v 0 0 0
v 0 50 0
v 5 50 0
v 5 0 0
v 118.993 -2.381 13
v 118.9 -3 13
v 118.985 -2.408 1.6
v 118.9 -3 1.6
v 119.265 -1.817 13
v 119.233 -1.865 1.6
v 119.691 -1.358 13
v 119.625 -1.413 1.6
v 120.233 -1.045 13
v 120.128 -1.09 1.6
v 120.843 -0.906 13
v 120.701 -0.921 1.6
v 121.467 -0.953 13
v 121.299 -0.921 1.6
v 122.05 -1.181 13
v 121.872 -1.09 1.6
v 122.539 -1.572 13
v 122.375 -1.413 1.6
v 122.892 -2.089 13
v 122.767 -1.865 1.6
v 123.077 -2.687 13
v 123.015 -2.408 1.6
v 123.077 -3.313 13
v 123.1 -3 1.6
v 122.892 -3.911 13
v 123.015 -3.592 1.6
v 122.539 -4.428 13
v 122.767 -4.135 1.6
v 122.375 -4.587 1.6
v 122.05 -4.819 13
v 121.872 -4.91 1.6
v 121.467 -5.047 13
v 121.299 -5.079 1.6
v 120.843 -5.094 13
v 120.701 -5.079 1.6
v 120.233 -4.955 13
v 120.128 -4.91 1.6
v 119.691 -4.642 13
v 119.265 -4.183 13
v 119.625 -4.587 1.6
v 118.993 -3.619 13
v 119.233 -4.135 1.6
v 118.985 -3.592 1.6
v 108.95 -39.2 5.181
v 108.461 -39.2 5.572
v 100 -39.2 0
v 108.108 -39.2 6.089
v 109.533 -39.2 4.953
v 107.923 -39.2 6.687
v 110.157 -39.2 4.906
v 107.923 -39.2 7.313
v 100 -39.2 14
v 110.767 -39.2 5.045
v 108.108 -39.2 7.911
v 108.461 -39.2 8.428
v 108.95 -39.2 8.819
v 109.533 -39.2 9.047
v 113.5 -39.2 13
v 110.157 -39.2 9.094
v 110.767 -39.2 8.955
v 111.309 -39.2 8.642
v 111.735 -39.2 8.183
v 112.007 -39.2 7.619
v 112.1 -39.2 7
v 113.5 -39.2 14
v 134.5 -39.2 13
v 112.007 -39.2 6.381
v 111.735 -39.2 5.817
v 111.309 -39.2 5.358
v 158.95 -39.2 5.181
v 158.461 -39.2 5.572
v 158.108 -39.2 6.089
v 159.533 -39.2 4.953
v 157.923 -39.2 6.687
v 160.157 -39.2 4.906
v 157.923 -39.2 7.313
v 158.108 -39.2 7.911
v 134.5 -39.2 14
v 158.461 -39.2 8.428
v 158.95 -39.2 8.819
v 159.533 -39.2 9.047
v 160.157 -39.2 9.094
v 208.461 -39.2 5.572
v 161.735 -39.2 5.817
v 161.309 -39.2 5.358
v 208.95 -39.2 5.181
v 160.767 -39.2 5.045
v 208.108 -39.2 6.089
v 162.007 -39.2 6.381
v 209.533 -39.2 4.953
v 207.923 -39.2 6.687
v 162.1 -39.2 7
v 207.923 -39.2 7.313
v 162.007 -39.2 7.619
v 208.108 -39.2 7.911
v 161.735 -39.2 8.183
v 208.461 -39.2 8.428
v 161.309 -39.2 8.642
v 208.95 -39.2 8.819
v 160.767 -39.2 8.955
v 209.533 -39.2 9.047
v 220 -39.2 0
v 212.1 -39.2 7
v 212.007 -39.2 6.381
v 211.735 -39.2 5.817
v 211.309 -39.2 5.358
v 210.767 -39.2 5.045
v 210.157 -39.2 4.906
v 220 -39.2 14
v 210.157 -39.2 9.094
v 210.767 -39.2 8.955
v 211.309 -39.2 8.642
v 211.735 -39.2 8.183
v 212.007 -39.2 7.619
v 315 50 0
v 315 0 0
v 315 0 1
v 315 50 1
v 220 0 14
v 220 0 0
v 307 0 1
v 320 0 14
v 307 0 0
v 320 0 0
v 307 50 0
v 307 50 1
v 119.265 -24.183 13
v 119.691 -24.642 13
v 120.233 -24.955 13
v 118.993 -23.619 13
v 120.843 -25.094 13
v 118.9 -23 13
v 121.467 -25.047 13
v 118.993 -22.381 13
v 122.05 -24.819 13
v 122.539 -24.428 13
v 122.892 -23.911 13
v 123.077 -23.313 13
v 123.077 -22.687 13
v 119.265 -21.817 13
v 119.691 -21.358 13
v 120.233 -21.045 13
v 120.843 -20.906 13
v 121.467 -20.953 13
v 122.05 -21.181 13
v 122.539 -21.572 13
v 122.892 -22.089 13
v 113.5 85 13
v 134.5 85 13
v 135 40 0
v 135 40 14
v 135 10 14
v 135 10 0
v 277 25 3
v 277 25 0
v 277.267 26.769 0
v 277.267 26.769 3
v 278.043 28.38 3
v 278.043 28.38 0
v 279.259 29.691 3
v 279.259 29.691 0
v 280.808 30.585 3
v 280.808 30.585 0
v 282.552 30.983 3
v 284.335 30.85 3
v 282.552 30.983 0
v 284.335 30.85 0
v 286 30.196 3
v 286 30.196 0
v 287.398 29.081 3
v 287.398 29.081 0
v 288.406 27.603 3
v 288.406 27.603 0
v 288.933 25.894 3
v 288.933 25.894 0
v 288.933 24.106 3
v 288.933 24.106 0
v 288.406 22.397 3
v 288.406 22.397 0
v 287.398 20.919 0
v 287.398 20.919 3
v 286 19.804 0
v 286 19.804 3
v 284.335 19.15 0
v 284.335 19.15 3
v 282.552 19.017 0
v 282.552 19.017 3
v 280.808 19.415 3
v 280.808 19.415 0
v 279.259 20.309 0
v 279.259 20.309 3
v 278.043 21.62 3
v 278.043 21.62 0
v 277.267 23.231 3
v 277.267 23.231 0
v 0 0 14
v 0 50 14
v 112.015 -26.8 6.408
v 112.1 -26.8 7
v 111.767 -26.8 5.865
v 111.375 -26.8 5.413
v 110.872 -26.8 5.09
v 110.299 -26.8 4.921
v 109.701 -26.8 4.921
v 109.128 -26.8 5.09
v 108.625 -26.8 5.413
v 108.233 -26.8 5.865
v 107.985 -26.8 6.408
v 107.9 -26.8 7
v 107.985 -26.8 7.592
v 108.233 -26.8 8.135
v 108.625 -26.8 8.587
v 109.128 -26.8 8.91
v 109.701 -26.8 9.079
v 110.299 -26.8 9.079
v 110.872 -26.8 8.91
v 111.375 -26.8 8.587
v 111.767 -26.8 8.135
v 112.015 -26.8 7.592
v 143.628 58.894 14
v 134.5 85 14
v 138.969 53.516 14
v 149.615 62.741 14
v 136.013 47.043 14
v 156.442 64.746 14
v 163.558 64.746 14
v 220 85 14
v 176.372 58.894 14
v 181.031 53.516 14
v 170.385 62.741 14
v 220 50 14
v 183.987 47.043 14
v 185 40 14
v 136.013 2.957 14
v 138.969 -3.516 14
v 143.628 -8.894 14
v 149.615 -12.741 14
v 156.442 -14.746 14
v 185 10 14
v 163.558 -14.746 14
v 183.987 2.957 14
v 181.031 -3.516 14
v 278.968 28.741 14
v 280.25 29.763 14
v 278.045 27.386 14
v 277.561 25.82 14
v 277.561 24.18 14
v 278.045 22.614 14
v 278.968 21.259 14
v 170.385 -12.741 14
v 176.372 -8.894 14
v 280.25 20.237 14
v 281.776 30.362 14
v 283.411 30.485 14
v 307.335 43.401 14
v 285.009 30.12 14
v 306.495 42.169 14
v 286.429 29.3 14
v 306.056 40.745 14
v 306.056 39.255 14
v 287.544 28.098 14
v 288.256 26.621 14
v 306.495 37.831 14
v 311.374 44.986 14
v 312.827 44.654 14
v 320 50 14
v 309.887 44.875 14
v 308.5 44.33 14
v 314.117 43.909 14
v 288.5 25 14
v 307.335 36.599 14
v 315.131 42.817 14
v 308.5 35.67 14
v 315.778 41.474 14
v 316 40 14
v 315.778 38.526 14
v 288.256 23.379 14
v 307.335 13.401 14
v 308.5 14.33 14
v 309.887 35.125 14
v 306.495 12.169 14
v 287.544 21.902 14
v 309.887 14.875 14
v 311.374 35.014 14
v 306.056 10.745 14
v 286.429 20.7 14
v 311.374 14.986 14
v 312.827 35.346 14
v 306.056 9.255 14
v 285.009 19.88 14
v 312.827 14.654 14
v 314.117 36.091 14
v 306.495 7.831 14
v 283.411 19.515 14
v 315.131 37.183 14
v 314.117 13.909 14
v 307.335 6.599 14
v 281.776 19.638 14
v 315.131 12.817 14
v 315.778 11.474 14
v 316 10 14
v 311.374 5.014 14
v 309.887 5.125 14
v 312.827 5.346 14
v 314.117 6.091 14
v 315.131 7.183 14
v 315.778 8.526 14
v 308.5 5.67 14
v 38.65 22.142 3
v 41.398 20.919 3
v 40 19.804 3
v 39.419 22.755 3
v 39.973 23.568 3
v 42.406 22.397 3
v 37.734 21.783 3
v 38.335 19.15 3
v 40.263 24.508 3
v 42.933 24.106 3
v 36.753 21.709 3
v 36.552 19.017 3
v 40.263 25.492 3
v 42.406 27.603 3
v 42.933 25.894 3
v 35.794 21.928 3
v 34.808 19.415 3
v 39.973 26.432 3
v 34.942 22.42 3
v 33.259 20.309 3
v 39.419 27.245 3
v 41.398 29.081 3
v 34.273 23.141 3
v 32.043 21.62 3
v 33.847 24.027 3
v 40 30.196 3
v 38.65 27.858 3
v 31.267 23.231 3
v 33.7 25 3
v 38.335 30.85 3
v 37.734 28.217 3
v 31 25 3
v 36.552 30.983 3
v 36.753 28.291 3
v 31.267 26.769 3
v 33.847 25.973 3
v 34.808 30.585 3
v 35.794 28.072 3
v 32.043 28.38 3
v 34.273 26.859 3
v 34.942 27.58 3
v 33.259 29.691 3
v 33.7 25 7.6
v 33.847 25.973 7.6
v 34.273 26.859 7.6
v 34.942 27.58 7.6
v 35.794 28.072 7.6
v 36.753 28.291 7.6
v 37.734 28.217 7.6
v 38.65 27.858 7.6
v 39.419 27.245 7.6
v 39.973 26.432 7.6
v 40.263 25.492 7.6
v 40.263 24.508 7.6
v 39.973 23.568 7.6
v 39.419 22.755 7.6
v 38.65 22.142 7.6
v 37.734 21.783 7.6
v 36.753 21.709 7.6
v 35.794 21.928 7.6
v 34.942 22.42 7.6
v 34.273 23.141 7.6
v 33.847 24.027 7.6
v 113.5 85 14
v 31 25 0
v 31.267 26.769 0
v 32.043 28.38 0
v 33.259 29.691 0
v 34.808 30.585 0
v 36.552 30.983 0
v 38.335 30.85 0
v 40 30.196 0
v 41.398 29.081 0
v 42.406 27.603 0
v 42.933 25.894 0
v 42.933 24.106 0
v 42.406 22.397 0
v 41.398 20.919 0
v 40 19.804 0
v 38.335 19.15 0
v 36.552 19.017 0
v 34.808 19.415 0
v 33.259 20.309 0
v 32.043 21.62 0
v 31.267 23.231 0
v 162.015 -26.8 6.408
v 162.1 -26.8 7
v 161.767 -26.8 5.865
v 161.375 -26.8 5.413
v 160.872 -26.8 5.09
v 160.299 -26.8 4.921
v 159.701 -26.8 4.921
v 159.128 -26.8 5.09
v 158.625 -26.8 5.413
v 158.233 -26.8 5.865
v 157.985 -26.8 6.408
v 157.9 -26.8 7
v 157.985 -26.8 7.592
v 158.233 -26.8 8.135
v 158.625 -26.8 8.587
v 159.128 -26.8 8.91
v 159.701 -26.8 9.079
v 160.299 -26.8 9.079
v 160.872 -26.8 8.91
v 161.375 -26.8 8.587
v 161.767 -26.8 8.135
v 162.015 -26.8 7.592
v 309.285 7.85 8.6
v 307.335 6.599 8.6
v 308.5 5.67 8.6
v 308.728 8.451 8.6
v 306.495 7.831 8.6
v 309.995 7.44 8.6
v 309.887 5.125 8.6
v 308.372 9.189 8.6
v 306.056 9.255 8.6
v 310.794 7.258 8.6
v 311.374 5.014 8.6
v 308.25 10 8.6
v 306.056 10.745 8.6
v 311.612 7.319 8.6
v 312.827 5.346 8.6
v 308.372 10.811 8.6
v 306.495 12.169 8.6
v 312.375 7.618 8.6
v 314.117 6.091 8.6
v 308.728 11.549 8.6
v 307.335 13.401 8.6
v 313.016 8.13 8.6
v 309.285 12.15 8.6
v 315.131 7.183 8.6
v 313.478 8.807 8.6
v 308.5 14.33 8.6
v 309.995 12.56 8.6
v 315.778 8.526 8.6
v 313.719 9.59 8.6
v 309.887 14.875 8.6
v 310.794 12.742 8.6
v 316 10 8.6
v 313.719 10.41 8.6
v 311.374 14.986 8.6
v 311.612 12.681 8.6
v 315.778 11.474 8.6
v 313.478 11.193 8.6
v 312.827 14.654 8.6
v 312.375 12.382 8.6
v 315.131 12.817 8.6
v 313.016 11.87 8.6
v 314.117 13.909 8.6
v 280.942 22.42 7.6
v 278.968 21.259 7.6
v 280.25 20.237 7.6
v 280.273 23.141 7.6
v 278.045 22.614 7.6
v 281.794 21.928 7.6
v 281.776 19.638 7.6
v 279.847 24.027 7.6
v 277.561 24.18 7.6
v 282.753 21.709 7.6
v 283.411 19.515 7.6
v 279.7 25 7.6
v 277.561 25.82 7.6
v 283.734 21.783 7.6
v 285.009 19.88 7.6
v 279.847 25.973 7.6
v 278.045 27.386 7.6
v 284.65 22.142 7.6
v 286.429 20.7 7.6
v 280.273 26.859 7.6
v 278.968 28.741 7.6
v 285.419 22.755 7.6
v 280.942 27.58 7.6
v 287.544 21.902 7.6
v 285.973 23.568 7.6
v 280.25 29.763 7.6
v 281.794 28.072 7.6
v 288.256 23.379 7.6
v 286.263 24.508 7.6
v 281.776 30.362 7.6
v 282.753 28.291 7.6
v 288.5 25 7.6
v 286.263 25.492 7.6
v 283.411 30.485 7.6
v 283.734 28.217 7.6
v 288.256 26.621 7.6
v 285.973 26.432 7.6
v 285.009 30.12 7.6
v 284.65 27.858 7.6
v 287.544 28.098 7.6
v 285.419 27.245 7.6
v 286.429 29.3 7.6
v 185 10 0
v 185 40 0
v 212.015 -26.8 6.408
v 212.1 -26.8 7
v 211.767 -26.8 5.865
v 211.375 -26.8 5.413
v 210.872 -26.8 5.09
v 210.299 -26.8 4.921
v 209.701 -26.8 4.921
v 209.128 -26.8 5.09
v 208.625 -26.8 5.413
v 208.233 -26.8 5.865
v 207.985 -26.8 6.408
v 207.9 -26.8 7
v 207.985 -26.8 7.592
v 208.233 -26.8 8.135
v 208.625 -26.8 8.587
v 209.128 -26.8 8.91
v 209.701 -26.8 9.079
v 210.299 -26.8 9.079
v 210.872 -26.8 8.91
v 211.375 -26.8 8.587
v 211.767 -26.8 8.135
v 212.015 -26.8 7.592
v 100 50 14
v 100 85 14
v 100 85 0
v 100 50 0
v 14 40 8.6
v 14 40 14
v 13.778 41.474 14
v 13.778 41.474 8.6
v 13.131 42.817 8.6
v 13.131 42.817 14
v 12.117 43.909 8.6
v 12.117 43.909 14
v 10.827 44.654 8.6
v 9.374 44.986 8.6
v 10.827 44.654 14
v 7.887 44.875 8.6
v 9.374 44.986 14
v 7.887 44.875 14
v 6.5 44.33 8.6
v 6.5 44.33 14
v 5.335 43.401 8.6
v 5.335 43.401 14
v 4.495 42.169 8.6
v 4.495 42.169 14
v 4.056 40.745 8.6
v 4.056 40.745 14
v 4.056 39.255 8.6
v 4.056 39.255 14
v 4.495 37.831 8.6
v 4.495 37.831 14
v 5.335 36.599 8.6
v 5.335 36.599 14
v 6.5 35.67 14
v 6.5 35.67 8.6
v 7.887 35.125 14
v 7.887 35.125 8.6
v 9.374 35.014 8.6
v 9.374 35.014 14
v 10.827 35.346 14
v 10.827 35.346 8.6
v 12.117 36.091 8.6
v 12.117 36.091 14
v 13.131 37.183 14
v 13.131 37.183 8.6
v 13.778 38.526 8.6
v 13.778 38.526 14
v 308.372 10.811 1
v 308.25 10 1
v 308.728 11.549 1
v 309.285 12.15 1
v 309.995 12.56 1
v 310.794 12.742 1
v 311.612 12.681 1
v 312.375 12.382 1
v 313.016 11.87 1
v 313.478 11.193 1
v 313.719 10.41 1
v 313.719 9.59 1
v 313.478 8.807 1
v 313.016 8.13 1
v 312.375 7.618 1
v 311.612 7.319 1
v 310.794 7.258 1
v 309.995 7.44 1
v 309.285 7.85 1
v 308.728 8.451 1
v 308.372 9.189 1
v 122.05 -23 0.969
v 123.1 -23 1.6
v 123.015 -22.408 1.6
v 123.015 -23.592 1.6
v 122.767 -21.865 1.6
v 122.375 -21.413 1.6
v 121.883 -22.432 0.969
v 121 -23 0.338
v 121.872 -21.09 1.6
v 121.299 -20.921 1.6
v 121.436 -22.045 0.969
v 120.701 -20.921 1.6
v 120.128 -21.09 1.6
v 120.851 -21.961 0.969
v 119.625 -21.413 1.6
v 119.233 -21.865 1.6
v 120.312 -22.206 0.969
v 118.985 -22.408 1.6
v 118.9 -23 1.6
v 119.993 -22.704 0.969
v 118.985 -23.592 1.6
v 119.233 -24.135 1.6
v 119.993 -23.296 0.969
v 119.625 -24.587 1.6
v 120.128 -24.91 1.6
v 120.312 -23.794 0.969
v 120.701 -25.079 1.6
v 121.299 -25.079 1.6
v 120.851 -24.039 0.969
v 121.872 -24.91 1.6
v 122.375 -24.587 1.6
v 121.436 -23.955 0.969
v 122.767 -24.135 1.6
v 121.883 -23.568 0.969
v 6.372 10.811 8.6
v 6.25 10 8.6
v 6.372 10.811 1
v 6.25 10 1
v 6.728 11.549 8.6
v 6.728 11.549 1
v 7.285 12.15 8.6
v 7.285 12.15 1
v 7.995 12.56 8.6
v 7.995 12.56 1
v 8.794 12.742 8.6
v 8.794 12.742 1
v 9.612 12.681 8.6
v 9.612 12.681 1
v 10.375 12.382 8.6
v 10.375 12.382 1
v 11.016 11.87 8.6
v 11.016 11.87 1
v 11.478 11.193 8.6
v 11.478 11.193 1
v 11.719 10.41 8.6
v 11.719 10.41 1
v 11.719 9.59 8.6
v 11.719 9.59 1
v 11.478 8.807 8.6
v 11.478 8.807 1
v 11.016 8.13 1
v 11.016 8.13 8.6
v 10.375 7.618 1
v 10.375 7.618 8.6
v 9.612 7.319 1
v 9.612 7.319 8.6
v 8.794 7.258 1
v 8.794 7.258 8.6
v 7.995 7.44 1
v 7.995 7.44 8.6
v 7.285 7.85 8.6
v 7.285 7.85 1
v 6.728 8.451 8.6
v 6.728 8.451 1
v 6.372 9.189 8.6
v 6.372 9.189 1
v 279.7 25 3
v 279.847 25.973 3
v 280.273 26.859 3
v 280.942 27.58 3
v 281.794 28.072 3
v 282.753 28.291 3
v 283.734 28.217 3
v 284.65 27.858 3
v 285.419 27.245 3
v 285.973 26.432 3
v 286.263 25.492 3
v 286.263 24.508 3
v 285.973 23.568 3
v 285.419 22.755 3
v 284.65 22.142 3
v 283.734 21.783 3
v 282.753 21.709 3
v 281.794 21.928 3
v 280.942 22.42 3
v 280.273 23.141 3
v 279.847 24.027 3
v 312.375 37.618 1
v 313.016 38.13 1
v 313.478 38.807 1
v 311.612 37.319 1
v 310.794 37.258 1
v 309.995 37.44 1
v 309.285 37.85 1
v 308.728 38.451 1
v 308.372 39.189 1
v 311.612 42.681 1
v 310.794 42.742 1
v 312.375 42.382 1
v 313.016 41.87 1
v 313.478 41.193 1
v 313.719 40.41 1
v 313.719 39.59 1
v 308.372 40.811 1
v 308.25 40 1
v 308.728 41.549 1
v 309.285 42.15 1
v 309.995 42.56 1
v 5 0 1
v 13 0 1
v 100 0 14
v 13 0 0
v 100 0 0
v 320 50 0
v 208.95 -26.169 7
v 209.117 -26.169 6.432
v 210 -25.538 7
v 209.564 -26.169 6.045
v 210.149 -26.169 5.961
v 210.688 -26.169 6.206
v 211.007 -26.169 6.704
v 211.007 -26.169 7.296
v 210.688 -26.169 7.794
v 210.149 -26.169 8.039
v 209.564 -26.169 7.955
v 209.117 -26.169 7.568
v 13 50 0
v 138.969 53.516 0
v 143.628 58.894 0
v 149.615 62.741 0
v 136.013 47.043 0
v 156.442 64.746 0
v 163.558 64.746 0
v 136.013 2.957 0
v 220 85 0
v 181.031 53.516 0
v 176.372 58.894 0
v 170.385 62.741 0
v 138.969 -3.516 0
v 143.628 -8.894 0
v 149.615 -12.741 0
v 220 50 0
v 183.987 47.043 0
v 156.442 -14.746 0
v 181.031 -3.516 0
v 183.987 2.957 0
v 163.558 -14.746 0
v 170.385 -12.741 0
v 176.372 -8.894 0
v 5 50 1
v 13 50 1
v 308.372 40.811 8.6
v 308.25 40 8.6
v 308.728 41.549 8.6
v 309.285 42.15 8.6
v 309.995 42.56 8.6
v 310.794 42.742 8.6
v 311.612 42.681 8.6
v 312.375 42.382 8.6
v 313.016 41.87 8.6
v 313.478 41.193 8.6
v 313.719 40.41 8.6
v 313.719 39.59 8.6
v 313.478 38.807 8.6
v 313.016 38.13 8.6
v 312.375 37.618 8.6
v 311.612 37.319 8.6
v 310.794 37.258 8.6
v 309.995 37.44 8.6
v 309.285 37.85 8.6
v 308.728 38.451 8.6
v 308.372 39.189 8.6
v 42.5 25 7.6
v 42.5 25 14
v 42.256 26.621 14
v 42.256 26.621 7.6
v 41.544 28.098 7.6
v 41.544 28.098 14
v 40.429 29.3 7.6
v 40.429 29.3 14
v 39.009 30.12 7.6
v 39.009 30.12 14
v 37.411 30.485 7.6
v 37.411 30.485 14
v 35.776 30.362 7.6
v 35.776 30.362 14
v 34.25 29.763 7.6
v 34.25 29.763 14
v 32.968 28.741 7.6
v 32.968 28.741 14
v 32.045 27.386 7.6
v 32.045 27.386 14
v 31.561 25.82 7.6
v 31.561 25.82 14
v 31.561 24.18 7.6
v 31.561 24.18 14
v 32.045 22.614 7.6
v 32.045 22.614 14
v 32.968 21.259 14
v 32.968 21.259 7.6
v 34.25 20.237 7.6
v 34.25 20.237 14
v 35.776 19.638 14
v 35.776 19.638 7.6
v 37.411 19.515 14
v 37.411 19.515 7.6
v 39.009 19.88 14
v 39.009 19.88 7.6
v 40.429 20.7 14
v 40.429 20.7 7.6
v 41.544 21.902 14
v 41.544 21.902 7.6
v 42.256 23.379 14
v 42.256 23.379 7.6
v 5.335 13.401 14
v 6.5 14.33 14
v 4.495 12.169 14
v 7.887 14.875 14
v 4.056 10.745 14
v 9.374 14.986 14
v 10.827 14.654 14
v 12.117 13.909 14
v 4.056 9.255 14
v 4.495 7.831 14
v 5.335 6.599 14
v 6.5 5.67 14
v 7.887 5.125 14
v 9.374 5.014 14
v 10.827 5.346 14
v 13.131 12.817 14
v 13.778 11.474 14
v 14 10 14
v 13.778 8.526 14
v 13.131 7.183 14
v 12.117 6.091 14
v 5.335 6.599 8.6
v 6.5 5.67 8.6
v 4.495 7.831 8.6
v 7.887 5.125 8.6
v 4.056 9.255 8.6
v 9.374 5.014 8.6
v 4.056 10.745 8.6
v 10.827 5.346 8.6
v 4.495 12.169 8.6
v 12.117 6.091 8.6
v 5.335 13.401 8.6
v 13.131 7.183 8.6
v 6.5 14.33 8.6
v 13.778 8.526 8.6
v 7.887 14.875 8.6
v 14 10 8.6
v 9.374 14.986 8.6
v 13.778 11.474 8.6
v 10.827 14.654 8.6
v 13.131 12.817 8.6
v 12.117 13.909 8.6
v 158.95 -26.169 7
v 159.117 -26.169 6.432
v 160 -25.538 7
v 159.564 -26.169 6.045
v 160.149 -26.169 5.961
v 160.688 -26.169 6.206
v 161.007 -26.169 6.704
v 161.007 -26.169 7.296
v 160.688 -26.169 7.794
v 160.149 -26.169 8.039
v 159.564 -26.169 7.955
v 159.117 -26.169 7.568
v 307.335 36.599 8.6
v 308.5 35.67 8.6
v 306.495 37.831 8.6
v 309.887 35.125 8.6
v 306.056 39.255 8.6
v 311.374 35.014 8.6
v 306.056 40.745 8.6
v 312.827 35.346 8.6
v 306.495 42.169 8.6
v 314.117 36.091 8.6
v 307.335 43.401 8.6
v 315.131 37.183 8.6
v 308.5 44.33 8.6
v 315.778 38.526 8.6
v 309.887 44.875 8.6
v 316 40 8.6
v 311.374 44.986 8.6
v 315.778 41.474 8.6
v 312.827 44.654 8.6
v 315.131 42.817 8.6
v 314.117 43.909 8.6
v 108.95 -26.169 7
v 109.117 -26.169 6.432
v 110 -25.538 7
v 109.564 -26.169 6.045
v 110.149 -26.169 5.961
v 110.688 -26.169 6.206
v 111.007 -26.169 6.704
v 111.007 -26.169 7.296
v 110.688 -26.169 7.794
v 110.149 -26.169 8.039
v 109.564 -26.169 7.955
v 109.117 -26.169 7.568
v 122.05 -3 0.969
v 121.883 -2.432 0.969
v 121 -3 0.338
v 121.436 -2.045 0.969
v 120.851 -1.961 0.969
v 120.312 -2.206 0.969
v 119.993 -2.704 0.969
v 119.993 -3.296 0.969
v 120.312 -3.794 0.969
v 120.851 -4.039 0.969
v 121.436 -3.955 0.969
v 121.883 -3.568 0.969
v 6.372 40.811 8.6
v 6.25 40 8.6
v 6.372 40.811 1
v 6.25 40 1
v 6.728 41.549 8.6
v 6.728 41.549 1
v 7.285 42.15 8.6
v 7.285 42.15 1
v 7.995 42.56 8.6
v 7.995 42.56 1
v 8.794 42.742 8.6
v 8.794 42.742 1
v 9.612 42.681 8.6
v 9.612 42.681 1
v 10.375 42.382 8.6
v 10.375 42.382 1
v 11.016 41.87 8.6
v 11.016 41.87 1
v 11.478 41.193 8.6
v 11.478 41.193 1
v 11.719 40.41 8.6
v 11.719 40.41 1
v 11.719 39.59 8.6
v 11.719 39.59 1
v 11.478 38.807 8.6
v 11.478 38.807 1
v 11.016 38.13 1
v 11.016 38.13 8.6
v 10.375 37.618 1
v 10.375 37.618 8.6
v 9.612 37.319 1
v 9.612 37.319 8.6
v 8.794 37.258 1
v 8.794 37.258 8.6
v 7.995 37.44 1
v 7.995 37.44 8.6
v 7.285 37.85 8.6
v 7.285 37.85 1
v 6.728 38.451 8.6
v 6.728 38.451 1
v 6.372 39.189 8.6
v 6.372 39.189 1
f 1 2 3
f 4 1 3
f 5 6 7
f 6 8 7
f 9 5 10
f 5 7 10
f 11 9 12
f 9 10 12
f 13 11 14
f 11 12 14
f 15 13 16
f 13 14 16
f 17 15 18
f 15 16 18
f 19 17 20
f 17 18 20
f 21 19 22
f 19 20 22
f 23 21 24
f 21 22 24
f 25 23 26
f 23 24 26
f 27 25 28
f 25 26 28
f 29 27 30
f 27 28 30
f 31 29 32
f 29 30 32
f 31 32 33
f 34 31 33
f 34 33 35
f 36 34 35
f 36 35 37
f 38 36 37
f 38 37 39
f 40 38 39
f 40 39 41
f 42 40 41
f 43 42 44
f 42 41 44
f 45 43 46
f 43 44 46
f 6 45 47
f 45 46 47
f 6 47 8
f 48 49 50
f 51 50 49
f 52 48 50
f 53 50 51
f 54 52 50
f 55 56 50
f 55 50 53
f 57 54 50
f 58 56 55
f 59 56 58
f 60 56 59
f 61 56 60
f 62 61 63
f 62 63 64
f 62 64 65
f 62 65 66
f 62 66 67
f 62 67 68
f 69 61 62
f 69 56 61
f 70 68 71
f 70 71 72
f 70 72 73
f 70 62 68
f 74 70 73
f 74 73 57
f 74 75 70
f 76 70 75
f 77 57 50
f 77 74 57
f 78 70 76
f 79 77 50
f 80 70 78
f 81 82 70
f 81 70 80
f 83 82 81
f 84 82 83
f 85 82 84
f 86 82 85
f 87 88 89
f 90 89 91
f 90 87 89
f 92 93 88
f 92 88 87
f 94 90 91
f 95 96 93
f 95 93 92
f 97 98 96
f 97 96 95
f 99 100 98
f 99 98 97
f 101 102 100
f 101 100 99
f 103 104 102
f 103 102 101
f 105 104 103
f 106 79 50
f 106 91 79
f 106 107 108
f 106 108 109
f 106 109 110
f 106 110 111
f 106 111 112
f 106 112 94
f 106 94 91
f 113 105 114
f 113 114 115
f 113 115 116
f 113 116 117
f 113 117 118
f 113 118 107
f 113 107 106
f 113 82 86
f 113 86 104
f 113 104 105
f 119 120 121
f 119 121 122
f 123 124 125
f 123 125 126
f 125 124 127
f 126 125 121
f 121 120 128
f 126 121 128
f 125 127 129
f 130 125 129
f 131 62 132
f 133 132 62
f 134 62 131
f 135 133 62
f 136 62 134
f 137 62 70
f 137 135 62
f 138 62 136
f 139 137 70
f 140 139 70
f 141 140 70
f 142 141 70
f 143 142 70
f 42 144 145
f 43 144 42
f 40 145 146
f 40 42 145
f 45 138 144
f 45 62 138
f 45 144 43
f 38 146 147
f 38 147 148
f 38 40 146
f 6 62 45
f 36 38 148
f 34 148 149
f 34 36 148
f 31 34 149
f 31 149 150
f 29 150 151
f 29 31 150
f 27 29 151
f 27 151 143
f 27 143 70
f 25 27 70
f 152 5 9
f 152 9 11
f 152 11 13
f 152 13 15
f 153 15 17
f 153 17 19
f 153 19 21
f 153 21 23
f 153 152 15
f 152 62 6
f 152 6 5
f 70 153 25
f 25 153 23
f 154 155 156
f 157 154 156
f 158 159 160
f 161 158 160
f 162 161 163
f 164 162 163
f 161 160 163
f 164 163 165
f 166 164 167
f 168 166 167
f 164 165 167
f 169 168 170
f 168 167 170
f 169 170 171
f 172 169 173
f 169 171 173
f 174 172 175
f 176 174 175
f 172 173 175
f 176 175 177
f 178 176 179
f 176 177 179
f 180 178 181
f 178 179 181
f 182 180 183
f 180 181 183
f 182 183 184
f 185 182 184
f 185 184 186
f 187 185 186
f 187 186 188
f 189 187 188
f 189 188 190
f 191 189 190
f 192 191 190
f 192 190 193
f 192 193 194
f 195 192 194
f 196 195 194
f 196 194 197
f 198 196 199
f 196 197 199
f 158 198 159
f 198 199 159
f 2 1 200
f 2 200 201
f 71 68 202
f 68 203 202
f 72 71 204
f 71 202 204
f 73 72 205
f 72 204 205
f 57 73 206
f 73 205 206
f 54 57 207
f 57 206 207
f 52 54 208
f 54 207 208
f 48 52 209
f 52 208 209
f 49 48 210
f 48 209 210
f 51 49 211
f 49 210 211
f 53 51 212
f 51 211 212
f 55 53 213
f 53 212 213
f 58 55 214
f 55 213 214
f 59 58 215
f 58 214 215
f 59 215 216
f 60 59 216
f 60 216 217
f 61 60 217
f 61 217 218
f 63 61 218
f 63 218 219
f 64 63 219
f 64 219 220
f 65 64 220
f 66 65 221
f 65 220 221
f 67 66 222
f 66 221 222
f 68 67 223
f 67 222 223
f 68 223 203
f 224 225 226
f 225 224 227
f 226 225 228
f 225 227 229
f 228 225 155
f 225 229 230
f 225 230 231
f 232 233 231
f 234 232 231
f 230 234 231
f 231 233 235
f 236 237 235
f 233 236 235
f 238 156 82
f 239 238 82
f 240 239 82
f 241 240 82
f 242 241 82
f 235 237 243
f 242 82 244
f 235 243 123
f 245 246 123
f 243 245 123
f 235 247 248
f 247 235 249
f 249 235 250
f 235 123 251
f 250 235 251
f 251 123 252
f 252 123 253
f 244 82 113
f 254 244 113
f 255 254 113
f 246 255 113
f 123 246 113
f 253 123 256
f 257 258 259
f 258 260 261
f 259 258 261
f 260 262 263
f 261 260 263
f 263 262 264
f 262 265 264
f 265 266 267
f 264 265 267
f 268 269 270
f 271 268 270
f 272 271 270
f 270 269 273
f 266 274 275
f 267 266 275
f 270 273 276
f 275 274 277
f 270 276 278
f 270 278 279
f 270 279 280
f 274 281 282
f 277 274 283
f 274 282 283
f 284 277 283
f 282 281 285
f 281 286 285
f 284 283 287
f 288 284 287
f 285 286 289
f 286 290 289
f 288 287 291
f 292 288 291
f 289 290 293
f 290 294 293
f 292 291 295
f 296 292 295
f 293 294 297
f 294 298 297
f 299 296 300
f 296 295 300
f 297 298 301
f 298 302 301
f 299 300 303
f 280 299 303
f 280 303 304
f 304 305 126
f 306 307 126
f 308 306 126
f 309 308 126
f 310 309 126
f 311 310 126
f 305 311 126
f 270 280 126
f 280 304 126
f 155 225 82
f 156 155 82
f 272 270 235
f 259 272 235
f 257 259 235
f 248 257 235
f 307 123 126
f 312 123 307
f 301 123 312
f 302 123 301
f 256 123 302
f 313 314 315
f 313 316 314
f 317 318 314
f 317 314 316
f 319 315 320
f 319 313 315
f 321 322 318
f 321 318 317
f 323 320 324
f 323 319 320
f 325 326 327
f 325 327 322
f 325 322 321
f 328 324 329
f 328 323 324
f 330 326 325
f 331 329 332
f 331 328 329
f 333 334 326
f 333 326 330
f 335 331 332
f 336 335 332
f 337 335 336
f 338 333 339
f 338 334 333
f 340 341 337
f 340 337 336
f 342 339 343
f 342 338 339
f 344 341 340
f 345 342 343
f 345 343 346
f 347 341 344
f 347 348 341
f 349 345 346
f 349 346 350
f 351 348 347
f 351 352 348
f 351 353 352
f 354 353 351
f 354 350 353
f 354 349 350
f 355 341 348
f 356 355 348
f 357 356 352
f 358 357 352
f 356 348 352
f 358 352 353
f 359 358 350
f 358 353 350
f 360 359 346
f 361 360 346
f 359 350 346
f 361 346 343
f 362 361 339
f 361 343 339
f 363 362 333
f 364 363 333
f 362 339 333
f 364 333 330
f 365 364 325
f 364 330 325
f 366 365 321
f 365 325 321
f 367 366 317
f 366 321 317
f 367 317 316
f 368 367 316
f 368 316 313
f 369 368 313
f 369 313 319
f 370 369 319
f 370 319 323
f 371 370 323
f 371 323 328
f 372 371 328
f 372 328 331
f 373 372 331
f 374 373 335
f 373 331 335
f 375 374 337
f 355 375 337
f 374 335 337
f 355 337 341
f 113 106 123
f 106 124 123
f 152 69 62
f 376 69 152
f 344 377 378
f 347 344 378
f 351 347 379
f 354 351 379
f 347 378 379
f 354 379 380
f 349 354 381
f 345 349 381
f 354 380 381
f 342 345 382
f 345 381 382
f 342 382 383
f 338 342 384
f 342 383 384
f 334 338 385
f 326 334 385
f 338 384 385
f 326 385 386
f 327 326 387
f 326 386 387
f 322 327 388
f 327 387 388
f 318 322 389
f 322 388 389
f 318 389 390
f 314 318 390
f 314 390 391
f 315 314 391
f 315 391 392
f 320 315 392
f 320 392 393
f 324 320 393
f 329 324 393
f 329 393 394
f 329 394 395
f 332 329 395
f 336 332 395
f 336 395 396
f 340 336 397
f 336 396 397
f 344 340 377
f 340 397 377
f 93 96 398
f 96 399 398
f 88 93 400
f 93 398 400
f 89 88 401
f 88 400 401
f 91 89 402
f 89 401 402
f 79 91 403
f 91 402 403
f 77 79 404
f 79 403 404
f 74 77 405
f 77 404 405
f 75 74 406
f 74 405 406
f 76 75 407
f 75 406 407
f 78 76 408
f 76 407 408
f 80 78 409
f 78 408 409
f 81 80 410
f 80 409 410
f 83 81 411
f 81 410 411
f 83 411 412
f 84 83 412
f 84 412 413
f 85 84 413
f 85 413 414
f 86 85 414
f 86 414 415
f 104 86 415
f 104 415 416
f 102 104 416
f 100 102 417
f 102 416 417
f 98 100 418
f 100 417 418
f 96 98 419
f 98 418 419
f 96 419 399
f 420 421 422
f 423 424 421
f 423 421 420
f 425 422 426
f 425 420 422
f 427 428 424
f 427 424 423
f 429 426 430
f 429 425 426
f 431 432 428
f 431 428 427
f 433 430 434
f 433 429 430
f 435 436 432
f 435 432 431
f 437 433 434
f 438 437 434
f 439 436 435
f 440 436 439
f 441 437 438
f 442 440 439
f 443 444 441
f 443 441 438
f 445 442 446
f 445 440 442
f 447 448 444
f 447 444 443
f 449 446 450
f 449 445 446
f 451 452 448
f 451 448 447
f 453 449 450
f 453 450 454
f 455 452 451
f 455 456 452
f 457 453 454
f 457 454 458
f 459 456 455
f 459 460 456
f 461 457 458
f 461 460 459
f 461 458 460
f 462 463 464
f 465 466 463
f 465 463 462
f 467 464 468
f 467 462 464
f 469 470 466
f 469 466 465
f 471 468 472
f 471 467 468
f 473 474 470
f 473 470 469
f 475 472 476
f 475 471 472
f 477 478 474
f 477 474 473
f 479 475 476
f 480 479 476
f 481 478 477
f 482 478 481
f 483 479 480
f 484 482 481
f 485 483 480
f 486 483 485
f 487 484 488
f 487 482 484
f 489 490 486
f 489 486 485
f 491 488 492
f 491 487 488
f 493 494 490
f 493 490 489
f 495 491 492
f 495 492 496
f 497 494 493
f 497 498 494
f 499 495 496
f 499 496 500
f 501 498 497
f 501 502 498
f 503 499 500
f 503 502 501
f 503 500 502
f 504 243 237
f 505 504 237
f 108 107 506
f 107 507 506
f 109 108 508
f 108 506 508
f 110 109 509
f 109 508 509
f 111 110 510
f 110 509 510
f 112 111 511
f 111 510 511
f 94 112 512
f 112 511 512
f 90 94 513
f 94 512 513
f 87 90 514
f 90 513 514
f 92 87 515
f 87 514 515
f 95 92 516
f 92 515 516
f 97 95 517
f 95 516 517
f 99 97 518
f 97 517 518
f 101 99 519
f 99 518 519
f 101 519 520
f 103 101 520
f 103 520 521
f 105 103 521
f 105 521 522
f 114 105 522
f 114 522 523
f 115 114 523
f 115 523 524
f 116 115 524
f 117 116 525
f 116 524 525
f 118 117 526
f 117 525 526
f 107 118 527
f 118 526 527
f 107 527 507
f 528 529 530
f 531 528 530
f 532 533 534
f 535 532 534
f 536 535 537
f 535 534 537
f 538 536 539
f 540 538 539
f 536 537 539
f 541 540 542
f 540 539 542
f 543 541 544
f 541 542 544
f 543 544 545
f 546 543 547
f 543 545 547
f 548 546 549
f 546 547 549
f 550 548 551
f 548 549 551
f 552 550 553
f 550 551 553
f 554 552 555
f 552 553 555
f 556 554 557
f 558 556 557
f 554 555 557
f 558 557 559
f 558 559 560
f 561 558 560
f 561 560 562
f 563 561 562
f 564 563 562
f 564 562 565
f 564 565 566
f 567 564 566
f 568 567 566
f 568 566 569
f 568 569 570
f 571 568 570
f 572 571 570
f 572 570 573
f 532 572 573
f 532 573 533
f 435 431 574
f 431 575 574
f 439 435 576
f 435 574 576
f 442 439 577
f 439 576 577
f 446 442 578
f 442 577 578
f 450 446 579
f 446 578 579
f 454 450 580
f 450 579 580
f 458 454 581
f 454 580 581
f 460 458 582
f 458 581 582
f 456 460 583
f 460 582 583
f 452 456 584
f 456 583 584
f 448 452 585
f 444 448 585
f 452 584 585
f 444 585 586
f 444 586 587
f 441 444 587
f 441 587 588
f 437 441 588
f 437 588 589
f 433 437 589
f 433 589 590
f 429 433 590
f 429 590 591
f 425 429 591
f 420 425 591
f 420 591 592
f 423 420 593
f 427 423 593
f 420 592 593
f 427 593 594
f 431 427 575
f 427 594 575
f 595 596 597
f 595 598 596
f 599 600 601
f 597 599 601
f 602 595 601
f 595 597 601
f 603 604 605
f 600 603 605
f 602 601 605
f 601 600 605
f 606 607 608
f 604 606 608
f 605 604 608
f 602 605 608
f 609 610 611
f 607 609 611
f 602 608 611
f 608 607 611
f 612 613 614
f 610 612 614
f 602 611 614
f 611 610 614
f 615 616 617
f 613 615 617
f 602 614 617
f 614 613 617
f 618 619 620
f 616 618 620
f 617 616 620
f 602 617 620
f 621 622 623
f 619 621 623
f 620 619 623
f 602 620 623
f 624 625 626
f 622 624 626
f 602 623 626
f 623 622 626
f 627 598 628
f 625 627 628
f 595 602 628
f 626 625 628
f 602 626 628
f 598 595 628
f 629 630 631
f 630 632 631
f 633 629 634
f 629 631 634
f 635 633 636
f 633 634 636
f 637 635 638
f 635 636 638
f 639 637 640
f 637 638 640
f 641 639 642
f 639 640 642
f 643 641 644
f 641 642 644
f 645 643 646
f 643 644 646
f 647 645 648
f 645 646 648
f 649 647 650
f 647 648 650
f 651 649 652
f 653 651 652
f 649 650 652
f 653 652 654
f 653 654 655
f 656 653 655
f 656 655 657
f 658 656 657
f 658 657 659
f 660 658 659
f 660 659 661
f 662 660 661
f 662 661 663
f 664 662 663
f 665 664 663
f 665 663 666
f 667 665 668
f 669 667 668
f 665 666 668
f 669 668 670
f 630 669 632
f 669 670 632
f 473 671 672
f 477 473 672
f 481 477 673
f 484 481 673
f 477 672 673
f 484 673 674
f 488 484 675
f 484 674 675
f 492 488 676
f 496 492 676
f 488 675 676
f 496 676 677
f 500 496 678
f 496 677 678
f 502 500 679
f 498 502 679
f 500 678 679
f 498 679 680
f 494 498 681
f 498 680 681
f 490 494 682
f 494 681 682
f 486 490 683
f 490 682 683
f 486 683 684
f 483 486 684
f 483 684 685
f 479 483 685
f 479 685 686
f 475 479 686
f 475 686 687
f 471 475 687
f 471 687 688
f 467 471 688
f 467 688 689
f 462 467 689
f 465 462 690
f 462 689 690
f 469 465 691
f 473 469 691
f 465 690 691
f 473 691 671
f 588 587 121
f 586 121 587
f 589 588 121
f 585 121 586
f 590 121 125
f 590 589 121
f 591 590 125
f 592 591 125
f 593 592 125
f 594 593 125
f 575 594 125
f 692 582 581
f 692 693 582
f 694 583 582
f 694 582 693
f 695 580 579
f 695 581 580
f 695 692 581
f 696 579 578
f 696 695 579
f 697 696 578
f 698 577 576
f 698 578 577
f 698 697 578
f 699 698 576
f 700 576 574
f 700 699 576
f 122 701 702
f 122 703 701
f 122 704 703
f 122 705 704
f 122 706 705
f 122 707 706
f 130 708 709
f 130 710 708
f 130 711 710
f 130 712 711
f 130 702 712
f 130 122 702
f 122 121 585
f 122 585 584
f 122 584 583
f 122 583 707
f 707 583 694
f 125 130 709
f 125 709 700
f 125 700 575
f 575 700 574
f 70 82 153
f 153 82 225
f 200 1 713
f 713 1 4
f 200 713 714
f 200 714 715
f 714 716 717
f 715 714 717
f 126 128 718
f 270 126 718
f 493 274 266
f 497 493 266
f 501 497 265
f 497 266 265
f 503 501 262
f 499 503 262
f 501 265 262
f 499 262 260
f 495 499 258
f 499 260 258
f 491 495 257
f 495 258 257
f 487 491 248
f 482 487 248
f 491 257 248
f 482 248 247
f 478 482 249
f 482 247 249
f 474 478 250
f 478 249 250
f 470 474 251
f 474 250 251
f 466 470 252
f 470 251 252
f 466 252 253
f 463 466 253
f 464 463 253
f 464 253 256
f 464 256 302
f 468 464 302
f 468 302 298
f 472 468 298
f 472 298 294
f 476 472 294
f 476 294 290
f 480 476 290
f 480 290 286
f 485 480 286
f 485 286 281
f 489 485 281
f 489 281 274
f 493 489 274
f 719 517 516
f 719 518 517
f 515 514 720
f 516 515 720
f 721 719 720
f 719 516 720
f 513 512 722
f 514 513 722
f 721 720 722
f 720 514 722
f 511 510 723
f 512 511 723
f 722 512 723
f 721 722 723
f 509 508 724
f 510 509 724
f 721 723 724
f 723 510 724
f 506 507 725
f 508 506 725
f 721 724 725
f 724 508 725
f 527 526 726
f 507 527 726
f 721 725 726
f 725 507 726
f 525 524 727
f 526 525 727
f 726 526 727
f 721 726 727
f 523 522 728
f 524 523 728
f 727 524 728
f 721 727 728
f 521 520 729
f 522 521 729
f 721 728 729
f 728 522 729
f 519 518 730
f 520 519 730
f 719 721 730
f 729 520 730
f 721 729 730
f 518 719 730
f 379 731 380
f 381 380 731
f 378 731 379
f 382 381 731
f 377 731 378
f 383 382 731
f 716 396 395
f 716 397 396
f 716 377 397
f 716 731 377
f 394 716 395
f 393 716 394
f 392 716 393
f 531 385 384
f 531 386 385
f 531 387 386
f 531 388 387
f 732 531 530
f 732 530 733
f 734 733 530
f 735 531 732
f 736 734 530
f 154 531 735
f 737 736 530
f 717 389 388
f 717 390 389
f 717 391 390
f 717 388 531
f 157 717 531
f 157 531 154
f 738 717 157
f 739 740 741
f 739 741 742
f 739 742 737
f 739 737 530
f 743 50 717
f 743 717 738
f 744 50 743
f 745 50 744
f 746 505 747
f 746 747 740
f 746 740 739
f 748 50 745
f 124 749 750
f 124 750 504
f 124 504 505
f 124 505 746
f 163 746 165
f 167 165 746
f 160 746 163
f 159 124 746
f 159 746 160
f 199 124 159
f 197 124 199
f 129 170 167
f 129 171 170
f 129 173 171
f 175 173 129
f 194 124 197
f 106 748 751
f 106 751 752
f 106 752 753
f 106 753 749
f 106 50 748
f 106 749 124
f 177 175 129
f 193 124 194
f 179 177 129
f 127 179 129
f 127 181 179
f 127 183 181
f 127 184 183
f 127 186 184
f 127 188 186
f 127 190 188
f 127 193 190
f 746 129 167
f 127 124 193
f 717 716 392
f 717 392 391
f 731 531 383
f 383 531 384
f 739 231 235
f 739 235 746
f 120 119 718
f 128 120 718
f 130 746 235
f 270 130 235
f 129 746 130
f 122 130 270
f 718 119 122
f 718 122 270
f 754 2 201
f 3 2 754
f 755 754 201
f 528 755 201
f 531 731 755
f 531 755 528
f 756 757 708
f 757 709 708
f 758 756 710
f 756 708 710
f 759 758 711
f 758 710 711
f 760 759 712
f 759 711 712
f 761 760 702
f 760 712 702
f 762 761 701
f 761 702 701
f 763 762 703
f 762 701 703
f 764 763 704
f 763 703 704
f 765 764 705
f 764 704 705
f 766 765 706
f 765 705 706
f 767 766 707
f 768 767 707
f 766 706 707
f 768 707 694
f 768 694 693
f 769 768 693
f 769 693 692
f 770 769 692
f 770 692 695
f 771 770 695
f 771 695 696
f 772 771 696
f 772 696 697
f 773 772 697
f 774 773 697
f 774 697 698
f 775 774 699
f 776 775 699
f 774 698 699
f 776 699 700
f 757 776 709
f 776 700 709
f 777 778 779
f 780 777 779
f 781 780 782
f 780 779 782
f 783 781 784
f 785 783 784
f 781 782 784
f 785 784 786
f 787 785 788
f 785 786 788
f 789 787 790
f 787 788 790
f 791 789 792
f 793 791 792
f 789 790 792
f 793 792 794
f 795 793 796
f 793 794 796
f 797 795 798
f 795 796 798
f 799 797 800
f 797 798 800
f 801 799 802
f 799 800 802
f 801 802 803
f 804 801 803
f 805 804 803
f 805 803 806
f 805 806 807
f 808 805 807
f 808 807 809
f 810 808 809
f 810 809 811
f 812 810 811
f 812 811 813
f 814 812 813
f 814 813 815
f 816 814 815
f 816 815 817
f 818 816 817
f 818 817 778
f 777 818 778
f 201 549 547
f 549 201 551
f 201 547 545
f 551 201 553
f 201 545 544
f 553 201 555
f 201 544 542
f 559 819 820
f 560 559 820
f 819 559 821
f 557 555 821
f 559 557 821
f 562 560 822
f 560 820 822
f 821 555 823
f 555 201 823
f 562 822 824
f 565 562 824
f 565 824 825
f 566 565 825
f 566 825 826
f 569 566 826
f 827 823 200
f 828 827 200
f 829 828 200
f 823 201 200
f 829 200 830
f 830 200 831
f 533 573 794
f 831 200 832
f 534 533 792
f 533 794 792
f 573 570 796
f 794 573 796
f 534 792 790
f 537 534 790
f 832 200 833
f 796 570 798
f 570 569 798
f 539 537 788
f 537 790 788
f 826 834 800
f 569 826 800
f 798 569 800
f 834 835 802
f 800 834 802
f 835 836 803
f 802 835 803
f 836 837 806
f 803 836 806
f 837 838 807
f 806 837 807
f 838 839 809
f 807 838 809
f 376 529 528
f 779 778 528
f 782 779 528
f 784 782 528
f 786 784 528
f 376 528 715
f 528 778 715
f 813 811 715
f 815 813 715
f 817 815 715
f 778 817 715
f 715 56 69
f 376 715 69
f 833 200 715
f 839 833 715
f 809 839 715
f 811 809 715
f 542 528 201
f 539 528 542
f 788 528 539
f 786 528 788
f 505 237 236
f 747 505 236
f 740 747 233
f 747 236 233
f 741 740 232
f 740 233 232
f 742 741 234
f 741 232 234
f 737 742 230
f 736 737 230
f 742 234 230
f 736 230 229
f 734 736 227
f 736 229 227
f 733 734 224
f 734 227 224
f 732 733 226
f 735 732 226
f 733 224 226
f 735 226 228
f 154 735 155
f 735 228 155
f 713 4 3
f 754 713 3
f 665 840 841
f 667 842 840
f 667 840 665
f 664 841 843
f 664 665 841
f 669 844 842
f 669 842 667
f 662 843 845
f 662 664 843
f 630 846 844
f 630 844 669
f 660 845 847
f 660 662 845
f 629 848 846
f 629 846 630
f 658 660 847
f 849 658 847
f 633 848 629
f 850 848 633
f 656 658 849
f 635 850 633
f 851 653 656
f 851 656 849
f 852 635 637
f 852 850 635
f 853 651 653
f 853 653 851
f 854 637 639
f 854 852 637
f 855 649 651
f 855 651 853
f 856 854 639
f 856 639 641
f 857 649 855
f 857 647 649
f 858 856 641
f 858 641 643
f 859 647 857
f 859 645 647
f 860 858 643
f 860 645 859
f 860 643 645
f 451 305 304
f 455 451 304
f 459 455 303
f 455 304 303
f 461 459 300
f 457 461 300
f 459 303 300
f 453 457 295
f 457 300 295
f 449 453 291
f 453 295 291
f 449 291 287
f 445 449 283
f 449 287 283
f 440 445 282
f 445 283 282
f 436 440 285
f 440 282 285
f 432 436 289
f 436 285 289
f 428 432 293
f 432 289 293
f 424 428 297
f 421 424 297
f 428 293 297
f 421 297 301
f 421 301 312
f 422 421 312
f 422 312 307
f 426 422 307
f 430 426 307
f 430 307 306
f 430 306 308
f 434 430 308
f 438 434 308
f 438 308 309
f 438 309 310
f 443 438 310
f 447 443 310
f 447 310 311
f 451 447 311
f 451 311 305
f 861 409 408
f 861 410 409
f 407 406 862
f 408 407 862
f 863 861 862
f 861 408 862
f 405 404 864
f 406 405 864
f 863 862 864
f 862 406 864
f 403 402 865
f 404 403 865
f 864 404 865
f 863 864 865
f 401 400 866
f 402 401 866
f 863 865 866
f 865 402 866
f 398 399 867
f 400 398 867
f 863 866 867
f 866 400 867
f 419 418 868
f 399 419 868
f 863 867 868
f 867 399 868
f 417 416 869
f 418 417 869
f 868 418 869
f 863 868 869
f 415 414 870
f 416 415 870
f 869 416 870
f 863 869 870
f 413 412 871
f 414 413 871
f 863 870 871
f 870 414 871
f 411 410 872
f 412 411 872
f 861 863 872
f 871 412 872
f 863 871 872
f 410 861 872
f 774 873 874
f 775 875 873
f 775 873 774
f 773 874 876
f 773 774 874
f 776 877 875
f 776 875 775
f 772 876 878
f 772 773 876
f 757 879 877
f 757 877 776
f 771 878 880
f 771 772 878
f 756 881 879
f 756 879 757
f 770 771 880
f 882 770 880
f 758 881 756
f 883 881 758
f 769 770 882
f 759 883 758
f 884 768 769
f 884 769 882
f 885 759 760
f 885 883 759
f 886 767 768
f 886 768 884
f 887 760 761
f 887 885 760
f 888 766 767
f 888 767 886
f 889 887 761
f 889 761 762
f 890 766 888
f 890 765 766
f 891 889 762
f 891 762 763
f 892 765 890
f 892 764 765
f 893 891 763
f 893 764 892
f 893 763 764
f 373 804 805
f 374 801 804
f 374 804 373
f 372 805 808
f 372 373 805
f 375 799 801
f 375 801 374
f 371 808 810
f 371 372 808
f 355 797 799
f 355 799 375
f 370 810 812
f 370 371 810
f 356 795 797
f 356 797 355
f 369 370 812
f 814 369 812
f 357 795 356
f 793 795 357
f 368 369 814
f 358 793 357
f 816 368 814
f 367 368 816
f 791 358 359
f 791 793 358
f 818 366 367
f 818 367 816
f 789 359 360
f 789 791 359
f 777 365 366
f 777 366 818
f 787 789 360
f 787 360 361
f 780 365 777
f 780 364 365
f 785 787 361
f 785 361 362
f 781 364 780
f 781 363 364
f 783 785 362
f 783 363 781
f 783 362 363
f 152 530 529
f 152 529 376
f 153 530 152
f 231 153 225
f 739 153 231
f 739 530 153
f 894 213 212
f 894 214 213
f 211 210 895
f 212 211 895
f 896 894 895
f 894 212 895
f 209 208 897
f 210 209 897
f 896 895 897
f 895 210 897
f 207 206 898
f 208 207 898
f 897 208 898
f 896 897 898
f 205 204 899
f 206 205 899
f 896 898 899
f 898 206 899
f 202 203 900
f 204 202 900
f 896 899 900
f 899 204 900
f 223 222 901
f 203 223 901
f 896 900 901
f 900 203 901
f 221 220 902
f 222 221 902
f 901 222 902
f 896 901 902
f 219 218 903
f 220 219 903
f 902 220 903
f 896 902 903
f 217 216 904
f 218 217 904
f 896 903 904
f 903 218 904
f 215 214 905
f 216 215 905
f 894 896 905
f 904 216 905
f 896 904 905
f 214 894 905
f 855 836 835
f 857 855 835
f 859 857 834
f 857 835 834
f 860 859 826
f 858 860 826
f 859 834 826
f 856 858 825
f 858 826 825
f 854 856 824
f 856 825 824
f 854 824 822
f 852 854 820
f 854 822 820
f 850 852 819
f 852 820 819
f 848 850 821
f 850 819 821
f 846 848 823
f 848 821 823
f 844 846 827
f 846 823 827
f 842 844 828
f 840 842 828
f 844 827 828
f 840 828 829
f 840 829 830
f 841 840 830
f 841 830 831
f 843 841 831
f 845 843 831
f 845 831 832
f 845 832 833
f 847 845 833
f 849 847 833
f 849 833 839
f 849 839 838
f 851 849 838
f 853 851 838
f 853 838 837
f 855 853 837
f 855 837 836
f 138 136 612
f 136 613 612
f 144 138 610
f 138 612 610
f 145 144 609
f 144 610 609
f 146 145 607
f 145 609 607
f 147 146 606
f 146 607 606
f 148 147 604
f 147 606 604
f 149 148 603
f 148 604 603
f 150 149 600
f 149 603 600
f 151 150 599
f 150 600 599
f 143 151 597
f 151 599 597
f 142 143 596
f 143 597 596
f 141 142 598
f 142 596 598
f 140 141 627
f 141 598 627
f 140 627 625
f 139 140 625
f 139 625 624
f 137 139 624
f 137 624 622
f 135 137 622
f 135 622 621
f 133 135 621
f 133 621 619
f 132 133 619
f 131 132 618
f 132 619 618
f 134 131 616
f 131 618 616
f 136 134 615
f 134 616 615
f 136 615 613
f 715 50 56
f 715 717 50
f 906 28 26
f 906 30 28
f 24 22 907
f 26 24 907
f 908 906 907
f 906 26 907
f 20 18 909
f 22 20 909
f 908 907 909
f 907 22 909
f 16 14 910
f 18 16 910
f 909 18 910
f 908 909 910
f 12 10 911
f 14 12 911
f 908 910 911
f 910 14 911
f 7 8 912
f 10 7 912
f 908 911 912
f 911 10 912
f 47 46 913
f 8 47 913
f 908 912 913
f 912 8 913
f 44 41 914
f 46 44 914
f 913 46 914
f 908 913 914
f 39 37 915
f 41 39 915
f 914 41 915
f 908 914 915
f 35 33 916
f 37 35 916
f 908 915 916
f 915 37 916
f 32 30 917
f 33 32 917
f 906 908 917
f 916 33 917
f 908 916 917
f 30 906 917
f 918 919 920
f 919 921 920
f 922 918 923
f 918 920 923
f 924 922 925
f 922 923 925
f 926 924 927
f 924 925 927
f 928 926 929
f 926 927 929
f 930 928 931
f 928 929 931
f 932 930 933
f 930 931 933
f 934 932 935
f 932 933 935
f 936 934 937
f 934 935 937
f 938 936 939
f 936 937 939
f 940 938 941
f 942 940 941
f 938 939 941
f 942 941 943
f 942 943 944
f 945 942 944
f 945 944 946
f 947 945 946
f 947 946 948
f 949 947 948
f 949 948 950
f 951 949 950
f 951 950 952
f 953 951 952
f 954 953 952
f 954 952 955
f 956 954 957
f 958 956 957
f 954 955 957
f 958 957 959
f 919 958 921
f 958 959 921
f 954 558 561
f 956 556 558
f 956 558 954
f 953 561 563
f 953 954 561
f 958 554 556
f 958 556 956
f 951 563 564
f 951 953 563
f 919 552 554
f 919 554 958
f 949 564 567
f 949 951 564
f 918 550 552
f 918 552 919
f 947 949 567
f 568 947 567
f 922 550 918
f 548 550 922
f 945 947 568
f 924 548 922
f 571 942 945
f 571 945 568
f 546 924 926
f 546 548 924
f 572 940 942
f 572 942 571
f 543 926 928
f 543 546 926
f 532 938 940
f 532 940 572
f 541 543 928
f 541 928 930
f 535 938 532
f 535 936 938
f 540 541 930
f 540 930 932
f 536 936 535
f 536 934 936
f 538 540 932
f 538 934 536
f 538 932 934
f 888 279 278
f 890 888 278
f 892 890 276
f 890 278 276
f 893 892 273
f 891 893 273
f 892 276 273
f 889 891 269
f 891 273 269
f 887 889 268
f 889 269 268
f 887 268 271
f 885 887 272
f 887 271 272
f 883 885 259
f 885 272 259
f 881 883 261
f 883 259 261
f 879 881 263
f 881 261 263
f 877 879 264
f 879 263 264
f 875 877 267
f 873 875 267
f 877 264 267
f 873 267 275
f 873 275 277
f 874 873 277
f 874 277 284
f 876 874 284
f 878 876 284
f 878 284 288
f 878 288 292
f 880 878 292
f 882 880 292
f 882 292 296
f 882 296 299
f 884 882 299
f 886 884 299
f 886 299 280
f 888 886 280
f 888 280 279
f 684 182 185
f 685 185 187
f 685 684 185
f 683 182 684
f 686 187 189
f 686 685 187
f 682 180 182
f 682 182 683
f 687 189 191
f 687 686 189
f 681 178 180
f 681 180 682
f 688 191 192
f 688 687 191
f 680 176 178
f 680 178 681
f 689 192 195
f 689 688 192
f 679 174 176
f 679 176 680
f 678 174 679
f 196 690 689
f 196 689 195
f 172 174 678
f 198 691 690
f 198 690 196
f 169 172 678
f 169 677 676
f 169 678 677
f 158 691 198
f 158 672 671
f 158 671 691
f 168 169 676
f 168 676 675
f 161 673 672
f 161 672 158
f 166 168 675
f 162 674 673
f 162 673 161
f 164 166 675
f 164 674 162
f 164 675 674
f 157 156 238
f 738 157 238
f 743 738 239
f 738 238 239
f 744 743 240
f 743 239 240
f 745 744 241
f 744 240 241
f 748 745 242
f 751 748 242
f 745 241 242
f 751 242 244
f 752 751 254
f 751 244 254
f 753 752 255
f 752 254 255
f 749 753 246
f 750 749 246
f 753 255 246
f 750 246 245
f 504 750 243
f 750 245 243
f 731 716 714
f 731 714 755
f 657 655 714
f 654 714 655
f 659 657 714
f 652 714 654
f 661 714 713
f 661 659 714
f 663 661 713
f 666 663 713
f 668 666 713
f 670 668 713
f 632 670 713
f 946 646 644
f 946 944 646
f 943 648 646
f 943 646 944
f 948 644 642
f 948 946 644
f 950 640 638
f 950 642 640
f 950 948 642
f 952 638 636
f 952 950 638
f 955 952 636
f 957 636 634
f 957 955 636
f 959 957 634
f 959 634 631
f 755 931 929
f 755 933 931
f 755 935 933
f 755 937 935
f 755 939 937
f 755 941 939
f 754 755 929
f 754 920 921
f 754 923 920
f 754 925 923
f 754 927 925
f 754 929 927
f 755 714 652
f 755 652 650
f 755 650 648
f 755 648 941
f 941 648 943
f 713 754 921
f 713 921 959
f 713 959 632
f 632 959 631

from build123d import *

# Parameters (mm, degrees)
SKETCH_1_W                   = 320
SKETCH_1_H                   = 50
EXTRUDE_1_DEPTH              = 14
HOLE_WIZARD_M6_1_D           = 6.6
HOLE_WIZARD_M6_1_CBORE_D     = 11
HOLE_WIZARD_M6_1_CBORE_DEPTH = 6.4
SKETCH_5_R                   = 6
CUT_EXTRUDE_1_DEPTH          = 3
SKETCH_6_W                   = 8
SKETCH_6_H                   = 50
CUT_EXTRUDE_2_DEPTH          = 1
HOLE_WIZARD_M5_1_D           = 5.5
HOLE_WIZARD_M5_1_CBORE_D     = 10
HOLE_WIZARD_M5_1_CBORE_DEPTH = 5.4
SKETCH_9_W                   = 30
SKETCH_9_H                   = 14
CUT_EXTRUDE_3_DEPTH          = 15
SKETCH_10_W                  = 120
SKETCH_10_H                  = 100
SKETCH_10_R                  = 39
EXTRUDE_2_DEPTH              = 14
SKETCH_15_R                  = 39
EXTRUDE_3_DEPTH              = 14
CUT_EXTRUDE_4_DEPTH          = 31.5
SKETCH_17_W                  = 120
SKETCH_17_H                  = 14
EXTRUDE_4_DEPTH              = 14.2
SKETCH_18_W                  = 120
SKETCH_18_H                  = 14
EXTRUDE_5_DEPTH              = 10
HOLE_WIZARD_M5_1_2_D         = 4.2
HOLE_WIZARD_M5_1_2_DEPTH     = 12.4
HOLE_WIZARD_M5_1_2_TIP       = 1.2618073
SKETCH_21_W                  = 21
SKETCH_21_H                  = 124.2
CUT_EXTRUDE_5_DEPTH          = 1
HOLE_WIZARD_M5_2_D           = 4.2
HOLE_WIZARD_M5_2_DEPTH       = 12.4
HOLE_WIZARD_M5_2_TIP         = 1.2618073


with BuildPart() as part:
    # 草图1 → 凸台-拉伸1 (new body)
    with BuildSketch(Plane.XY):
        with Locations((160, 25)):
            Rectangle(SKETCH_1_W, SKETCH_1_H)
    extrude(amount=EXTRUDE_1_DEPTH)

    # M6 六角凹头螺钉的柱形沉头孔1 (through all)
    with Locations(Plane.XY.offset(14)):
        with Locations((283, 25), (37, 25)):
            CounterBoreHole(HOLE_WIZARD_M6_1_D / 2, HOLE_WIZARD_M6_1_CBORE_D / 2, HOLE_WIZARD_M6_1_CBORE_DEPTH)

    # 草图5 → 切除-拉伸1 (cut)
    with BuildSketch(Plane(origin=(0, 0, 0), x_dir=(-1, 0, 0), z_dir=(0, 0, -1))):
        with Locations((-283, 25)):
            Circle(SKETCH_5_R)
        with Locations((-37, 25)):
            Circle(SKETCH_5_R)
    extrude(amount=-CUT_EXTRUDE_1_DEPTH, mode=Mode.SUBTRACT)

    # 草图6 → 切除-拉伸2 (cut)
    with BuildSketch(Plane(origin=(0, 0, 0), x_dir=(-1, 0, 0), z_dir=(0, 0, -1))):
        with Locations((-9, 25)):
            Rectangle(SKETCH_6_W, SKETCH_6_H)
        with Locations((-311, 25)):
            Rectangle(SKETCH_6_W, SKETCH_6_H)
    extrude(amount=-CUT_EXTRUDE_2_DEPTH, mode=Mode.SUBTRACT)

    # Hole Wizard M5 _1 (through all)
    with Locations(Plane.XY.offset(14)):
        with Locations((311, 10), (311, 40), (9, 40), (9, 10)):
            CounterBoreHole(HOLE_WIZARD_M5_1_D / 2, HOLE_WIZARD_M5_1_CBORE_D / 2, HOLE_WIZARD_M5_1_CBORE_DEPTH)

    # 草图9 → 切除-拉伸3 (cut)
    with BuildSketch(Plane.XZ):
        with Locations((160, 7)):
            Rectangle(SKETCH_9_W, SKETCH_9_H)
    extrude(amount=-CUT_EXTRUDE_3_DEPTH, mode=Mode.SUBTRACT)

    # 草图10 → 凸台-拉伸2 (add)
    with BuildSketch(Plane.XY.offset(14)):
        with Locations((160, 25)):
            Rectangle(SKETCH_10_W, SKETCH_10_H)
        with Locations((160, 25)):
            Circle(SKETCH_10_R, mode=Mode.SUBTRACT)
    extrude(amount=-EXTRUDE_2_DEPTH)

    # 草图15 → 凸台-拉伸3 (add)
    with BuildSketch(Plane.XY.offset(14)):
        with Locations((160, 25)):
            Circle(SKETCH_15_R)
    extrude(amount=-EXTRUDE_3_DEPTH)

    # 草图16 → 切除-拉伸4 (cut)
    with BuildSketch(Plane.XY.offset(14)):
        with BuildLine():
            Line((185, 10), (185, 40))
            ThreePointArc((185, 40), (160, 65), (135, 40))
            Line((135, 40), (135, 10))
            ThreePointArc((135, 10), (160, -15), (185, 10))
        make_face()
    extrude(amount=-CUT_EXTRUDE_4_DEPTH, mode=Mode.SUBTRACT)

    # 草图17 → 凸台-拉伸4 (add)
    with BuildSketch(Plane.XZ.offset(25)):
        with Locations((160, 7)):
            Rectangle(SKETCH_17_W, SKETCH_17_H)
    extrude(amount=EXTRUDE_4_DEPTH)

    # 草图18 → 凸台-拉伸5 (add)
    with BuildSketch(Plane(origin=(0, 75, 0), x_dir=(1, 0, 0), z_dir=(0, 1, 0))):
        with Locations((160, -7)):
            Rectangle(SKETCH_18_W, SKETCH_18_H)
    extrude(amount=EXTRUDE_5_DEPTH)

    # Hole Wizard M5 _1 2
    with Locations(Plane.XY.offset(14)):
        with Locations((121, -3), (121, -23)):
            Hole(HOLE_WIZARD_M5_1_2_D / 2, depth=HOLE_WIZARD_M5_1_2_DEPTH)
            with Locations((0, 0, -(HOLE_WIZARD_M5_1_2_DEPTH + HOLE_WIZARD_M5_1_2_TIP / 2))):  # 118° drill point
                Cone(0, HOLE_WIZARD_M5_1_2_D / 2, HOLE_WIZARD_M5_1_2_TIP, mode=Mode.SUBTRACT)

    # 草图21 → 切除-拉伸5 (cut)
    with BuildSketch(Plane.XY.offset(14)):
        with Locations((124, 22.9)):
            Rectangle(SKETCH_21_W, SKETCH_21_H)
    extrude(amount=-CUT_EXTRUDE_5_DEPTH, mode=Mode.SUBTRACT)

    # M5 螺纹孔2
    with Locations(Plane(origin=(0, -39.2, 0), x_dir=(-1, 0, 0), z_dir=(0, -1, 0))):
        with Locations((-160, -7), (-110, -7), (-210, -7)):
            Hole(HOLE_WIZARD_M5_2_D / 2, depth=HOLE_WIZARD_M5_2_DEPTH)
            with Locations((0, 0, -(HOLE_WIZARD_M5_2_DEPTH + HOLE_WIZARD_M5_2_TIP / 2))):  # 118° drill point
                Cone(0, HOLE_WIZARD_M5_2_D / 2, HOLE_WIZARD_M5_2_TIP, mode=Mode.SUBTRACT)


solid = part.part
